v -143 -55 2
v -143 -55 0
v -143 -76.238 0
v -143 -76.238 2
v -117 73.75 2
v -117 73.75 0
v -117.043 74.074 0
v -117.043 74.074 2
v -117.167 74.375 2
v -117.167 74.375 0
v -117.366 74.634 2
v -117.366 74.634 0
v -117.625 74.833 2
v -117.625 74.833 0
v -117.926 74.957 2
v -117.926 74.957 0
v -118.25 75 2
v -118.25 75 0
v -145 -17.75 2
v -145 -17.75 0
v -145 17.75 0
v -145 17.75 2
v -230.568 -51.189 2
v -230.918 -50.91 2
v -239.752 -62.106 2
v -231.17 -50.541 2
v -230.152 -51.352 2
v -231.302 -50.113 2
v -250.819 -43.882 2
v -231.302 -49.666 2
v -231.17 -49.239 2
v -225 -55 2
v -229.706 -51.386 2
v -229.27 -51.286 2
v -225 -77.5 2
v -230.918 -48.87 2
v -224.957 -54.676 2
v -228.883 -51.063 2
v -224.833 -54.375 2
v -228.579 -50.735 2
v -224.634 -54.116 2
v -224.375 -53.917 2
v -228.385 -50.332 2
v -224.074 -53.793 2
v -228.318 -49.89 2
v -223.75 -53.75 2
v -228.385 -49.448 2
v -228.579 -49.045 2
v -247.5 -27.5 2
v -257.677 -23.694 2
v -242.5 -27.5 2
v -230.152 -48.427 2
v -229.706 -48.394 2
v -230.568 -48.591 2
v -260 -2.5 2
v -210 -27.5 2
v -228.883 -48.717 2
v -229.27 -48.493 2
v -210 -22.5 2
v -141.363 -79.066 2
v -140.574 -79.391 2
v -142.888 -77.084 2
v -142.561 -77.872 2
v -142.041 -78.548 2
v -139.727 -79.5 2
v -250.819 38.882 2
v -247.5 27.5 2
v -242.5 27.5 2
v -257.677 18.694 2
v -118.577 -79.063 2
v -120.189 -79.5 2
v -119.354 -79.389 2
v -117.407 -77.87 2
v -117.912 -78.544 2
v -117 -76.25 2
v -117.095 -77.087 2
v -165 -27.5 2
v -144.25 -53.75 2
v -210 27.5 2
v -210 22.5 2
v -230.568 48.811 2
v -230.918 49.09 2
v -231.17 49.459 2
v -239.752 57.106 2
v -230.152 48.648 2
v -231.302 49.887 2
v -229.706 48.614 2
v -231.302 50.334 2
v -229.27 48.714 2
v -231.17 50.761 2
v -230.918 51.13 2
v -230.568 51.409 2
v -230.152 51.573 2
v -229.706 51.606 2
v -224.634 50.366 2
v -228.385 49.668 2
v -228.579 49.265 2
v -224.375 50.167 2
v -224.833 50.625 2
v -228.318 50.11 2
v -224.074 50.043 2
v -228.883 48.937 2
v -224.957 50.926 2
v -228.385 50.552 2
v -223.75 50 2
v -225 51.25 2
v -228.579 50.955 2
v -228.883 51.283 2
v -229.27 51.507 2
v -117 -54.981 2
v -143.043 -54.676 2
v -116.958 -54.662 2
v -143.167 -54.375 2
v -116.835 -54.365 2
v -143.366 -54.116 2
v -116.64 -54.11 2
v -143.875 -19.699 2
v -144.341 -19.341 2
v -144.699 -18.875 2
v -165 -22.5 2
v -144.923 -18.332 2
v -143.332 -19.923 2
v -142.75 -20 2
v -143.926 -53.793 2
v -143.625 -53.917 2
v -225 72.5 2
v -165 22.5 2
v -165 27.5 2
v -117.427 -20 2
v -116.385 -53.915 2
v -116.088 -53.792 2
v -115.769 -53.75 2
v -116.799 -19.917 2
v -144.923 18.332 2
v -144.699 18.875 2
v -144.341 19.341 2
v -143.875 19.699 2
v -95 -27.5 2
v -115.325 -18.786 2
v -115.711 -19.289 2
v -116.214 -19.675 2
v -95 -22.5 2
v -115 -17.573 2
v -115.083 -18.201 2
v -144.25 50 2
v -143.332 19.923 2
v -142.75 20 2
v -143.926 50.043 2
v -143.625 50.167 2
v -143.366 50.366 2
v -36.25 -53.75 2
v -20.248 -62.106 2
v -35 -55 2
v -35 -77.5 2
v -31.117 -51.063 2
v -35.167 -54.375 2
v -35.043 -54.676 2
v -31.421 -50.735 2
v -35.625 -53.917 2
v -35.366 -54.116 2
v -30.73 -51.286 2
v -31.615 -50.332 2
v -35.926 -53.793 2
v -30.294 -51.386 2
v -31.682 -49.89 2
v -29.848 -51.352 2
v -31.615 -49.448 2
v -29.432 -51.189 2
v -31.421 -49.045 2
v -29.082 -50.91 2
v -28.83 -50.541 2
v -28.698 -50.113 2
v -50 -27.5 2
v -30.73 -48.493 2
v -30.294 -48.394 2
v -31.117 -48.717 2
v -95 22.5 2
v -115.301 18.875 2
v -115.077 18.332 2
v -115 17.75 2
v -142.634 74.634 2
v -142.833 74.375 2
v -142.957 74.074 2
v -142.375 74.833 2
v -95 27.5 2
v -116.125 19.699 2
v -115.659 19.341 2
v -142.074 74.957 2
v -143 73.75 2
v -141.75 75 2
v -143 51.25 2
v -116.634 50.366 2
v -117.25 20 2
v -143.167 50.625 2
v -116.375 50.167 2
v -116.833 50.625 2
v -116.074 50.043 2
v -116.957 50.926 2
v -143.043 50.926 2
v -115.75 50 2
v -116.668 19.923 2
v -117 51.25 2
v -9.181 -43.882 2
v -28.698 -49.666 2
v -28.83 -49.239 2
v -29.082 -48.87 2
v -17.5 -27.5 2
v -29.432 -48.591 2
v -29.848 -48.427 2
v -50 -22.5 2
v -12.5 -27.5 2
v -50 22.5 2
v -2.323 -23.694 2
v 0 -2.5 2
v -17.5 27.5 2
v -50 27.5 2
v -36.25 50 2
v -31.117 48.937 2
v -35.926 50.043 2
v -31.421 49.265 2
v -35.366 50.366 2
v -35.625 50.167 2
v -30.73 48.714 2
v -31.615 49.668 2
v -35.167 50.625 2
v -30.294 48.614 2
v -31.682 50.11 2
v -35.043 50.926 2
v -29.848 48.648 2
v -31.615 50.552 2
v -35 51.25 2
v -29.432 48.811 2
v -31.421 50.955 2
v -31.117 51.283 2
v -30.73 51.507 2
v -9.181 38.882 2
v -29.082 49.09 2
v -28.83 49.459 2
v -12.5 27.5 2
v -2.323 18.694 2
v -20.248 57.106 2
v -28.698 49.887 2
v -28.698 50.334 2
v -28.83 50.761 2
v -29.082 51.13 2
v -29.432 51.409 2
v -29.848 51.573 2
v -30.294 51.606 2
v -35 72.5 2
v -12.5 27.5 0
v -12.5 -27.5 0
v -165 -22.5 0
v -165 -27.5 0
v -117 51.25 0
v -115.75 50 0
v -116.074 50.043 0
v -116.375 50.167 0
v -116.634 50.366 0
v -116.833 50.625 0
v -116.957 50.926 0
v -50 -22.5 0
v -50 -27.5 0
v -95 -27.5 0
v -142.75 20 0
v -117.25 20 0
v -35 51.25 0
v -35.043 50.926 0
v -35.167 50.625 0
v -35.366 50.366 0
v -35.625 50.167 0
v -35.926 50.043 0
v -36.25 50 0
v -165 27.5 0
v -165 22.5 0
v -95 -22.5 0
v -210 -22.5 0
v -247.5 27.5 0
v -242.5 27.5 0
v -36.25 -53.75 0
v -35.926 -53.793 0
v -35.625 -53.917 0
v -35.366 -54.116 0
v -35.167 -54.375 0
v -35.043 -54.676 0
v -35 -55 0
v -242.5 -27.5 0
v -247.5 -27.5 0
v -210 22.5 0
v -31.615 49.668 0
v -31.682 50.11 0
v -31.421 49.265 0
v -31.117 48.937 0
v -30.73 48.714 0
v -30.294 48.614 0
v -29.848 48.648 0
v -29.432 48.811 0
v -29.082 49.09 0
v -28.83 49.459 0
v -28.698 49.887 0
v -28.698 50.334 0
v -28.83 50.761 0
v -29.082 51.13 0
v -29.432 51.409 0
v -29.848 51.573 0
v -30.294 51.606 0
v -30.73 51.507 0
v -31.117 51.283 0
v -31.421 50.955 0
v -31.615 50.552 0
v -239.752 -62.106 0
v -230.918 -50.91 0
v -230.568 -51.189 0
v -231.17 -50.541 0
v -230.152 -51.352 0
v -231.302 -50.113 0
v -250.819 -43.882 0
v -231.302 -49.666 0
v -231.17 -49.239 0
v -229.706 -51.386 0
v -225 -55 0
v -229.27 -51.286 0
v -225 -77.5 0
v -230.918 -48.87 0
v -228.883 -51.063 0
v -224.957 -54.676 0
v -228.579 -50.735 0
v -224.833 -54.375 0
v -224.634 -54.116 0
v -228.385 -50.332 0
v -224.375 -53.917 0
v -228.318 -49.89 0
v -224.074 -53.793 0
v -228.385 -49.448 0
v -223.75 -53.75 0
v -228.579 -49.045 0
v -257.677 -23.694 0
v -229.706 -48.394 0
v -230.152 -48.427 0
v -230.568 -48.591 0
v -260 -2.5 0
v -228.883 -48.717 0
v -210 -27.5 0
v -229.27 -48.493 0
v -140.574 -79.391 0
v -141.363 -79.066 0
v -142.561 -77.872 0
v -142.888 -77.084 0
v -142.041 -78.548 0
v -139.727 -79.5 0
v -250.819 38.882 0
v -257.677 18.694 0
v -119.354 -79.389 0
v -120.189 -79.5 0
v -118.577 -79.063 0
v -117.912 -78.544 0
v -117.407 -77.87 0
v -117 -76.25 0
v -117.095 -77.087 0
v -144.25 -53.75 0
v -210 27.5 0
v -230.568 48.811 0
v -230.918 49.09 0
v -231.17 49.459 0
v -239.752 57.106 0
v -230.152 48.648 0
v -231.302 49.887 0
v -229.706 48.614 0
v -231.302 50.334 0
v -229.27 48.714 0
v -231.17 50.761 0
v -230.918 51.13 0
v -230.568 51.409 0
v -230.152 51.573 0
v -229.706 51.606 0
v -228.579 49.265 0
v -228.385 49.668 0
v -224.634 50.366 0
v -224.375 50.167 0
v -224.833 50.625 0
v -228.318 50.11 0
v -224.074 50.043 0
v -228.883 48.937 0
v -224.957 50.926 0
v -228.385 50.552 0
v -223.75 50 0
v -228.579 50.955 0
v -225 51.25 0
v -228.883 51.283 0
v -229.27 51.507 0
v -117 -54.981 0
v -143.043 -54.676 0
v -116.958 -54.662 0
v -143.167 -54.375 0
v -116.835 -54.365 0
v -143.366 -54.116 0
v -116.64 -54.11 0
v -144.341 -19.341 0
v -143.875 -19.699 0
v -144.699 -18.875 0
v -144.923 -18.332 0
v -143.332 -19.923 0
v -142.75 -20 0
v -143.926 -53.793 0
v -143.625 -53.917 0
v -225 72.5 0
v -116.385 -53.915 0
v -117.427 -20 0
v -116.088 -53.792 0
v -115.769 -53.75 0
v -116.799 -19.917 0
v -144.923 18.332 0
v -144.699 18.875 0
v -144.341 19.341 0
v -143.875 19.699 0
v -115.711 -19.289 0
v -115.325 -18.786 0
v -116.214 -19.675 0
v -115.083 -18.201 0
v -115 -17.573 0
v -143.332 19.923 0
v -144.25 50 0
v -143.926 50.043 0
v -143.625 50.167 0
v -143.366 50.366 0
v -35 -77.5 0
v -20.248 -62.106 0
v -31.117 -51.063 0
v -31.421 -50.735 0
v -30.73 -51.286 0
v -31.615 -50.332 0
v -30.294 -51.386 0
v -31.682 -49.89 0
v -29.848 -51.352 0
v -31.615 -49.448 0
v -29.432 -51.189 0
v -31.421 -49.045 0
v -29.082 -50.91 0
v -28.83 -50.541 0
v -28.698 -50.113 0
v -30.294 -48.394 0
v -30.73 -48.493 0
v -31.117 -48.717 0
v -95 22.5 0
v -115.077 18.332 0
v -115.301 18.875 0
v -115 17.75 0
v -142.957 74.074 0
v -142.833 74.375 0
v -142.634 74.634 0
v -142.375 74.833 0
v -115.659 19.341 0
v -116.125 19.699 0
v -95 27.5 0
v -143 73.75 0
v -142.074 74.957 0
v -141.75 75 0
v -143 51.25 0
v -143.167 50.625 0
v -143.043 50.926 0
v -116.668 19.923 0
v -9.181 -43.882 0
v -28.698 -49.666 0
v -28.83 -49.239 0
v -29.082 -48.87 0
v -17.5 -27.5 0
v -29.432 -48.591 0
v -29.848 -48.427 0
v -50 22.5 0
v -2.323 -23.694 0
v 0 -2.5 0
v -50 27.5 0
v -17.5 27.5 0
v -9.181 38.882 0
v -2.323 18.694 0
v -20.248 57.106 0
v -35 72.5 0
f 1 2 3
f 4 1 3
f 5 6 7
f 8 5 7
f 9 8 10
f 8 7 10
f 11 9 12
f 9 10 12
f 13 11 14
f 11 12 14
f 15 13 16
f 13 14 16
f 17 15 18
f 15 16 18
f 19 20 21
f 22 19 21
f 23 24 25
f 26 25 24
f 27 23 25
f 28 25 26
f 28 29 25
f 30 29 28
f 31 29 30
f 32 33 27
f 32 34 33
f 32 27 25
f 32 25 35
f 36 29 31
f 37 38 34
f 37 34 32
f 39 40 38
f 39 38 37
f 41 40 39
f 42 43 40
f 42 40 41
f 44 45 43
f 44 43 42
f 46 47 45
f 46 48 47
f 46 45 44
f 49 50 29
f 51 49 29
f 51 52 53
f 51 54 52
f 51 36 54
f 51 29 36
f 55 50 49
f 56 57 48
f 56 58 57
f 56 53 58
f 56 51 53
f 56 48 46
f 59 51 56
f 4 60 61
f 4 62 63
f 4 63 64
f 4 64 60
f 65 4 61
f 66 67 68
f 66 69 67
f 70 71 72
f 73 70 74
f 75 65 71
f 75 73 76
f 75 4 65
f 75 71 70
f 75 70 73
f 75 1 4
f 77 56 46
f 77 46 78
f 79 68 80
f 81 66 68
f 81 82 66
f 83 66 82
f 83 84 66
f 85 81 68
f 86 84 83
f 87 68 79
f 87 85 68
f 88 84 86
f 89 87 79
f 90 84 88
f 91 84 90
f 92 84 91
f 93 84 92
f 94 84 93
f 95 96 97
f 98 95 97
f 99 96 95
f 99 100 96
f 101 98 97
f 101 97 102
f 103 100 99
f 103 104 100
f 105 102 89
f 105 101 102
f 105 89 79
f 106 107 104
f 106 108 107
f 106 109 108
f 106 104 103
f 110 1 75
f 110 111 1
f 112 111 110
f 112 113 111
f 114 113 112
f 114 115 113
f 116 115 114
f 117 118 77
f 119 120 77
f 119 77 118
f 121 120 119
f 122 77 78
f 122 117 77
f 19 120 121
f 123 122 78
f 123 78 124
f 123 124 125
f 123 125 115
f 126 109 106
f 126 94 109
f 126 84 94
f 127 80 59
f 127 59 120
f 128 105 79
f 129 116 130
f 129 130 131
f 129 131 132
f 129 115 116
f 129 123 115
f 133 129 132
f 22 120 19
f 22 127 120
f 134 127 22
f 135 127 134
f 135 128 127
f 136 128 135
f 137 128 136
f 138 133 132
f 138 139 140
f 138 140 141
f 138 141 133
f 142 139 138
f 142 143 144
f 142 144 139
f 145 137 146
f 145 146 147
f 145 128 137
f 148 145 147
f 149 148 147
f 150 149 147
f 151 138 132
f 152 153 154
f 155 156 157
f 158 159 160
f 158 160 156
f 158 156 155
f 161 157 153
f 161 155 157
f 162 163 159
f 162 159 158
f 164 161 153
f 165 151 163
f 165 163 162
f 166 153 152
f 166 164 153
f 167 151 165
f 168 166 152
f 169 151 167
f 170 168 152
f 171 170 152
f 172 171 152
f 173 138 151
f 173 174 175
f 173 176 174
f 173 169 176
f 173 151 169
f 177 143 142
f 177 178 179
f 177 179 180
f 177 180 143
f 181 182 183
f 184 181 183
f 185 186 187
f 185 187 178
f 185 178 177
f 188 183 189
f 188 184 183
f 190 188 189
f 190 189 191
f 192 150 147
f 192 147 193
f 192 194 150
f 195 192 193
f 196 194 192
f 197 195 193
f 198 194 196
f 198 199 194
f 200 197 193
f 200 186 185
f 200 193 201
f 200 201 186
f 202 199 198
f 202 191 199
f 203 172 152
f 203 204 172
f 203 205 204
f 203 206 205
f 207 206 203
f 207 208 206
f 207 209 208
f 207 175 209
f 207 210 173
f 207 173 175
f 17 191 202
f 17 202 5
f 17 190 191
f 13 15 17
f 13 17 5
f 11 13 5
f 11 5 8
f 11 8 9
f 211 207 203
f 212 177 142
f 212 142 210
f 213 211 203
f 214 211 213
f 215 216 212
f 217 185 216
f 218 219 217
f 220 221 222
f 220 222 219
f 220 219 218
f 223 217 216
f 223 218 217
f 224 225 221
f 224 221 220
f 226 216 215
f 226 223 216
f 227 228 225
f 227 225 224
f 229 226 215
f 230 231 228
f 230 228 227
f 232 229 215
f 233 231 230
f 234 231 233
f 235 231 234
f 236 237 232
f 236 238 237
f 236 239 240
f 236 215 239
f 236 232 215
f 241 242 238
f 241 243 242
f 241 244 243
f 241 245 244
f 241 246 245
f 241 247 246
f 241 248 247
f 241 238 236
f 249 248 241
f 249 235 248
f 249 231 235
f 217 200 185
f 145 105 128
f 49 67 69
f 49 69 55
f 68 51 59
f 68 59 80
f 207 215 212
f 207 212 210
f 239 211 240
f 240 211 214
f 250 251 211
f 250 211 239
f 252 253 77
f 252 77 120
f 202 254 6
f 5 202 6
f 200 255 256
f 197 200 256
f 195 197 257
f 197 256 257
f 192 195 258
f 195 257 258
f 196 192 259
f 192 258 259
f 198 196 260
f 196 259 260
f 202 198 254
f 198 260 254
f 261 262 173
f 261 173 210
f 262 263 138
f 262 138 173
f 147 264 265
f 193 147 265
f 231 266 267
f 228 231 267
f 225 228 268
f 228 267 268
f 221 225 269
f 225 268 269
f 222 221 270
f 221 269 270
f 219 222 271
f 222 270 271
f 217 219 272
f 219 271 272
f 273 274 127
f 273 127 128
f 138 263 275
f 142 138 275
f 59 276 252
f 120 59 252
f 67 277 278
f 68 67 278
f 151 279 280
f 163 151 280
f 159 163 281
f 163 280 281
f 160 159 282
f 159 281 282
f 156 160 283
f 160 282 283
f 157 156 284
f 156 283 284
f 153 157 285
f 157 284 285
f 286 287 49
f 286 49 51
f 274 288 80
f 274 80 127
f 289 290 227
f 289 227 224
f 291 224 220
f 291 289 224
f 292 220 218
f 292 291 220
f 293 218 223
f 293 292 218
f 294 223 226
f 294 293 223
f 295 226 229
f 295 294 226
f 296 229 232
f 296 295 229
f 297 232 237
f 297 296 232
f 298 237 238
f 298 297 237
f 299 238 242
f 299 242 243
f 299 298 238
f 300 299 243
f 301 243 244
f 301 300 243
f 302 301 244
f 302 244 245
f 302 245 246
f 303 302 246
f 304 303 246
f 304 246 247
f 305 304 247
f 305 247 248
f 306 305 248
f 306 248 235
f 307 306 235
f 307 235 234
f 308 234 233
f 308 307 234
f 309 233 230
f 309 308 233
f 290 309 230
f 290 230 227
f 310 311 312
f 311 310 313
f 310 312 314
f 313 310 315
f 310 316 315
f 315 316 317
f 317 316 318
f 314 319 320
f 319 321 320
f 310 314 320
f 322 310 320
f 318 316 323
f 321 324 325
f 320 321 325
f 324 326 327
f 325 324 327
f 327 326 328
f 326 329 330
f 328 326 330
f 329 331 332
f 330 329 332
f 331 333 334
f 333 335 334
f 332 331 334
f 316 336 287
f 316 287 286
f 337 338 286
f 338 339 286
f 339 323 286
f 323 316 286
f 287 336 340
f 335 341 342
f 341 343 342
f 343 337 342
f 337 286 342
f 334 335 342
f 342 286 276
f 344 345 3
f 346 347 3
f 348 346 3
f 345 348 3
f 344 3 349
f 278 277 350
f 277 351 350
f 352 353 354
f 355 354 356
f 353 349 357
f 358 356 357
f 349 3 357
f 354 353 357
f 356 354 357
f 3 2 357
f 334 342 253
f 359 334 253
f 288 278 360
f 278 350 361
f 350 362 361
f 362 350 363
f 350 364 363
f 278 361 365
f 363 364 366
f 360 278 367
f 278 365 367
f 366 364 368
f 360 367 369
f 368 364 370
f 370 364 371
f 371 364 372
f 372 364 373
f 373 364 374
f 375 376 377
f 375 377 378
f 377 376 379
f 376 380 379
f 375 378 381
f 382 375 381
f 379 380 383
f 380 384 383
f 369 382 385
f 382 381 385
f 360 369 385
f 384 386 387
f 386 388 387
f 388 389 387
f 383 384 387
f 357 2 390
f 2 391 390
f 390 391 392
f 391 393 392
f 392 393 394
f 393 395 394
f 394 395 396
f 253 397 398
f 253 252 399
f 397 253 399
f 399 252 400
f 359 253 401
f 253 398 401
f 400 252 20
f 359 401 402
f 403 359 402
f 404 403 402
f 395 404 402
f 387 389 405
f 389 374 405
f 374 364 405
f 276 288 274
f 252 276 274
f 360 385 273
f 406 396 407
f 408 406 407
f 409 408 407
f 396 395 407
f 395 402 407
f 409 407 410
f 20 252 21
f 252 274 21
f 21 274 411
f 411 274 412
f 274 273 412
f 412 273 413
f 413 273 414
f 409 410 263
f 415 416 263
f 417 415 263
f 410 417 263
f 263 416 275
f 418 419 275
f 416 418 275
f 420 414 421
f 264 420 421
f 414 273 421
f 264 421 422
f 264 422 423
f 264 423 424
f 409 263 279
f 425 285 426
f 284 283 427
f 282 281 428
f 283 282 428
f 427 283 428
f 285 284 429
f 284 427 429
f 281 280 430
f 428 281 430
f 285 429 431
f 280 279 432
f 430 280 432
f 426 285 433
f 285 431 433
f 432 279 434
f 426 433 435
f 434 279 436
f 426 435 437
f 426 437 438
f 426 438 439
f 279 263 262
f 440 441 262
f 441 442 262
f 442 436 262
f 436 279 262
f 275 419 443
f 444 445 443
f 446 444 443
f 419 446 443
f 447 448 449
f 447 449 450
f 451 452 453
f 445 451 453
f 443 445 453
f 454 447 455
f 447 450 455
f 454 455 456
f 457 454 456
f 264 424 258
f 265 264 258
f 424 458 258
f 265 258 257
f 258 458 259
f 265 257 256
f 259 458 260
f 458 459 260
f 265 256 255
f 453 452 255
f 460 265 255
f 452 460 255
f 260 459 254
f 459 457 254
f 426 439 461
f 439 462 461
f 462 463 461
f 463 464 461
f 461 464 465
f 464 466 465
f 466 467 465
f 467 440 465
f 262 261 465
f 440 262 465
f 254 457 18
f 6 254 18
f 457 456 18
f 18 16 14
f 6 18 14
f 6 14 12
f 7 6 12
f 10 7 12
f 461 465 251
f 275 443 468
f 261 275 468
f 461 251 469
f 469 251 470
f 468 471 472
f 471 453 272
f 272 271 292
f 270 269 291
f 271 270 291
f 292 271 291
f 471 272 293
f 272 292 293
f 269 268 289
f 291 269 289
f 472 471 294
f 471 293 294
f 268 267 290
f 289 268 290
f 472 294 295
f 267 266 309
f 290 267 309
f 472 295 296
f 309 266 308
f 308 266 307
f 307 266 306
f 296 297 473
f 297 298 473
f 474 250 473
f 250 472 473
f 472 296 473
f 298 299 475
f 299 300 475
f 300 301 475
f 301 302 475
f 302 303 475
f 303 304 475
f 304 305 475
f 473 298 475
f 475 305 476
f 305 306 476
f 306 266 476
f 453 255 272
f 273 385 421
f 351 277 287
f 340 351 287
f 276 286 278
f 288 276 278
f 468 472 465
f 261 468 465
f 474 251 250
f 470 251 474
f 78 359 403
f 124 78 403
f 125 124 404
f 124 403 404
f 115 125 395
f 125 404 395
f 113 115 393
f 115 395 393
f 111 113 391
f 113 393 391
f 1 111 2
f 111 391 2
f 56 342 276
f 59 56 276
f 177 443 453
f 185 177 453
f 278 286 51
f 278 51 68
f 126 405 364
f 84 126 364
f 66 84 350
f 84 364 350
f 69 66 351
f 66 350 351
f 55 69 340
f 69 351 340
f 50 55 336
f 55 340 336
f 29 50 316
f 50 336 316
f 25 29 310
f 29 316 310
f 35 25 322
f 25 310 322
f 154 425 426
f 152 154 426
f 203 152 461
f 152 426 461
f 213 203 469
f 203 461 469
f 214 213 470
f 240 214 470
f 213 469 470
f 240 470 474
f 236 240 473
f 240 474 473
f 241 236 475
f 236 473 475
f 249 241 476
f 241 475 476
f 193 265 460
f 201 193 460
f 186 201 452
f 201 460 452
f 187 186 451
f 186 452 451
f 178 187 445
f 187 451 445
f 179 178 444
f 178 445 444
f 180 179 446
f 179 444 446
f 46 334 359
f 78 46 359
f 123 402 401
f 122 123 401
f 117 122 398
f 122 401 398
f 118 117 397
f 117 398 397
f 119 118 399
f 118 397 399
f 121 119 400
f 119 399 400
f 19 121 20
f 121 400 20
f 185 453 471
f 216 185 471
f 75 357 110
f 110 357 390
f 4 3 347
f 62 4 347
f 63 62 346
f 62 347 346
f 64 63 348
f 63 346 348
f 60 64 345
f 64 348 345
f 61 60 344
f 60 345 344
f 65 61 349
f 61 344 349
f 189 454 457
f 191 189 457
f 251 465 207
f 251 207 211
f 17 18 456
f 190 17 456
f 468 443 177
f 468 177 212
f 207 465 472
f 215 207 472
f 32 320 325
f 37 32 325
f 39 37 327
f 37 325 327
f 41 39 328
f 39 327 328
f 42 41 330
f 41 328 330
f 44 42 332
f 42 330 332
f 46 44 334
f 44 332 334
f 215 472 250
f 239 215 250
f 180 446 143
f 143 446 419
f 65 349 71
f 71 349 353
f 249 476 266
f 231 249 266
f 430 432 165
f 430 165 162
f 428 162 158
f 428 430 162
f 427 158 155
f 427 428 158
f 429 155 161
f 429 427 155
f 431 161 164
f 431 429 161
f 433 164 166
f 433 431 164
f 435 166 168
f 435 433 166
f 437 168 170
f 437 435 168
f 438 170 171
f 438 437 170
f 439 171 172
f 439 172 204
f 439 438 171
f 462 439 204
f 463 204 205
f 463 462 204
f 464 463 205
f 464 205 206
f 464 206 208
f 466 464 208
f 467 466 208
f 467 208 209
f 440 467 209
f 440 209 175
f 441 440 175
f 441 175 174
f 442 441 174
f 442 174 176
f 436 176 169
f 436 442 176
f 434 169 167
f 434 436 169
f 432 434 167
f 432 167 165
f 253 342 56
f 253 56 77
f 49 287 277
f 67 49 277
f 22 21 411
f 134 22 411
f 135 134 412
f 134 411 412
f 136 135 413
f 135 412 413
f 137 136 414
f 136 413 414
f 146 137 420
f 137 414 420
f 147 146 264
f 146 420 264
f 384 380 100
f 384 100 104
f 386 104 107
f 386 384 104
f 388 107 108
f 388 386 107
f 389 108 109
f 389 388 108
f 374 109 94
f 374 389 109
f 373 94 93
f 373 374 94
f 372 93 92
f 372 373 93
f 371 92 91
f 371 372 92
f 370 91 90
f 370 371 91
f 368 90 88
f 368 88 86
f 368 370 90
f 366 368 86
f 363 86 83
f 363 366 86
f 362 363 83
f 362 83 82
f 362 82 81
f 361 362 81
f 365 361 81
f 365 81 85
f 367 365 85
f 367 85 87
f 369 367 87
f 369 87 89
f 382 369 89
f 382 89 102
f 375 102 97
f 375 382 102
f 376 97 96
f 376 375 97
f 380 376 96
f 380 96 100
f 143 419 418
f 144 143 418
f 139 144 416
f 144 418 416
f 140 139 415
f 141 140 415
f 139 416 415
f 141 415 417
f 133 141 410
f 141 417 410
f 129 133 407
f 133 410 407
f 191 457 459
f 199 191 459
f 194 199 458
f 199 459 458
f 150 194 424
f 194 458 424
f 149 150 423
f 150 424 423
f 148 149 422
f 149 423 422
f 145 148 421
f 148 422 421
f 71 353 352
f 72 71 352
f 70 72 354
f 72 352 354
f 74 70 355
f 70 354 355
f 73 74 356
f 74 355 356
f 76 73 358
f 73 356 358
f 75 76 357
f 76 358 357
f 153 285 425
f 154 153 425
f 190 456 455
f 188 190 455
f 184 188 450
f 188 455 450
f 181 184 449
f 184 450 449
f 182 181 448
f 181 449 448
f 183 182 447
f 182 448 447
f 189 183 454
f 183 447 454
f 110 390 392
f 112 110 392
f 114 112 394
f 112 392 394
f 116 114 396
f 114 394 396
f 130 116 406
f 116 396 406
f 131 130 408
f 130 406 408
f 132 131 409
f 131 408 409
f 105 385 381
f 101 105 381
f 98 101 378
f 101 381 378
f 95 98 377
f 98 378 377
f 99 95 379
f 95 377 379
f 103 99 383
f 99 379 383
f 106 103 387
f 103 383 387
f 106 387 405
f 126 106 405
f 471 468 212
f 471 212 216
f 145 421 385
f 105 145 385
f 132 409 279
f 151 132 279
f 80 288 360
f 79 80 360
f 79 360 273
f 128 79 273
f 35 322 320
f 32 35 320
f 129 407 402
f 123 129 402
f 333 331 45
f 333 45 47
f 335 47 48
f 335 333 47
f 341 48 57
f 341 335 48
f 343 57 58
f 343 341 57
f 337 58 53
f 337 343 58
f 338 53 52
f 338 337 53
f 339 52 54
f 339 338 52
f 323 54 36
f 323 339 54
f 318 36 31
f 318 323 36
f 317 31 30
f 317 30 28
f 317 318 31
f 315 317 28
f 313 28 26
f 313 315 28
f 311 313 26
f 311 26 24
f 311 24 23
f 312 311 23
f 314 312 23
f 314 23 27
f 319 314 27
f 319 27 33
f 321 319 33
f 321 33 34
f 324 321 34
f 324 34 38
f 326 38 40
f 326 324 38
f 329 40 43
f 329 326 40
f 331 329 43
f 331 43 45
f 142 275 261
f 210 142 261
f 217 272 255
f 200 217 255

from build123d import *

# Parameters (mm, degrees)
SZKIC1_R                    = 1.5
SZKIC1_W                    = 45
SZKIC1_H                    = 5
SZKIC1_W_2                  = 5
SZKIC1_H_2                  = 55
DODANIE_WYCI_GNI_CIE3_DEPTH = 2


with BuildPart() as part:
    # Szkic1 → Dodanie-wyciągnięcie3 (new body)
    with BuildSketch(Plane.XY):
        with BuildLine():
            Line((-139.727293062, -79.5), (-120.189002398, -79.5))
            ThreePointArc((-120.189002398, -79.5), (-117.912369122, -78.544329486), (-117, -76.25))
            Line((-117, -76.25), (-117, -54.98069498))
            ThreePointArc((-117, -54.98069498), (-116.639537786, -54.110462214), (-115.76930502, -53.75))
            Line((-115.76930502, -53.75), (-102.427025017, -53.75))
            Line((-102.427025017, -53.75), (-87.218924948, -53.75))
            Line((-87.218924948, -53.75), (-36.25, -53.75))
            ThreePointArc((-36.25, -53.75), (-35.366116524, -54.116116524), (-35, -55))
            Line((-35, -55), (-35, -77.5))
            ThreePointArc((-35, -77.5), (0, -2.5), (-35, 72.5))
            Line((-35, 72.5), (-35, 51.25))
            ThreePointArc((-35, 51.25), (-35.366116524, 50.366116524), (-36.25, 50))
            Line((-36.25, 50), (-90.072974983, 50))
            Line((-90.072974983, 50), (-102.072974983, 50))
            Line((-102.072974983, 50), (-115.75, 50))
            ThreePointArc((-115.75, 50), (-116.633883476, 50.366116524), (-117, 51.25))
            Line((-117, 51.25), (-117, 73.75))
            ThreePointArc((-117, 73.75), (-117.366116524, 74.633883476), (-118.25, 75))
            Line((-118.25, 75), (-141.75, 75))
            ThreePointArc((-141.75, 75), (-142.633883476, 74.633883476), (-143, 73.75))
            Line((-143, 73.75), (-143, 51.25))
            ThreePointArc((-143, 51.25), (-143.366116524, 50.366116524), (-144.25, 50))
            Line((-144.25, 50), (-157.927025017, 50))
            Line((-157.927025017, 50), (-169.927025017, 50))
            Line((-169.927025017, 50), (-223.75, 50))
            ThreePointArc((-223.75, 50), (-224.633883476, 50.366116524), (-225, 51.25))
            Line((-225, 51.25), (-225, 72.5))
            ThreePointArc((-225, 72.5), (-260, -2.5), (-225, -77.5))
            Line((-225, -77.5), (-225, -55))
            ThreePointArc((-225, -55), (-224.633883476, -54.116116524), (-223.75, -53.75))
            Line((-223.75, -53.75), (-172.781075052, -53.75))
            Line((-172.781075052, -53.75), (-157.572974983, -53.75))
            Line((-157.572974983, -53.75), (-144.25, -53.75))
            ThreePointArc((-144.25, -53.75), (-143.366116524, -54.116116524), (-143, -55))
            Line((-143, -55), (-143, -76.237644119))
            ThreePointArc((-143, -76.237644119), (-142.040816528, -78.548140635), (-139.727293062, -79.5))
        make_face()
        with Locations((-229.818345238, 50.110219647)):
            Circle(SZKIC1_R, mode=Mode.SUBTRACT)
        with Locations((-229.818345238, -49.889780353)):
            Circle(SZKIC1_R, mode=Mode.SUBTRACT)
        with Locations(Location((-30.181654762, -49.889780353, 0), (0, 0, 180))):
            Circle(SZKIC1_R, mode=Mode.SUBTRACT)
        with Locations(Location((-30.181654762, 50.110219647, 0), (0, 0, 180))):
            Circle(SZKIC1_R, mode=Mode.SUBTRACT)
        with Locations((-187.5, 25)):
            Rectangle(SZKIC1_W, SZKIC1_H, mode=Mode.SUBTRACT)
        with Locations((-187.5, -25)):
            Rectangle(SZKIC1_W, SZKIC1_H, mode=Mode.SUBTRACT)
        with Locations((-72.5, -25)):
            Rectangle(SZKIC1_W, SZKIC1_H, mode=Mode.SUBTRACT)
        with Locations((-72.5, 25)):
            Rectangle(SZKIC1_W, SZKIC1_H, mode=Mode.SUBTRACT)
        with Locations((-15, 0)):
            Rectangle(SZKIC1_W_2, SZKIC1_H_2, mode=Mode.SUBTRACT)
        with Locations((-245, 0)):
            Rectangle(SZKIC1_W_2, SZKIC1_H_2, mode=Mode.SUBTRACT)
        with BuildLine():
            Line((-142.75, 20), (-117.25, 20))
            ThreePointArc((-117.25, 20), (-115.659009742, 19.340990258), (-115, 17.75))
            Line((-115, 17.75), (-115, -17.572974983))
            ThreePointArc((-115, -17.572974983), (-115.71085917, -19.28914083), (-117.427025017, -20))
            Line((-117.427025017, -20), (-142.75, -20))
            ThreePointArc((-142.75, -20), (-144.340990258, -19.340990258), (-145, -17.75))
            Line((-145, -17.75), (-145, 17.75))
            ThreePointArc((-145, 17.75), (-144.340990258, 19.340990258), (-142.75, 20))
        make_face(mode=Mode.SUBTRACT)
    extrude(amount=DODANIE_WYCI_GNI_CIE3_DEPTH)


solid = part.part
